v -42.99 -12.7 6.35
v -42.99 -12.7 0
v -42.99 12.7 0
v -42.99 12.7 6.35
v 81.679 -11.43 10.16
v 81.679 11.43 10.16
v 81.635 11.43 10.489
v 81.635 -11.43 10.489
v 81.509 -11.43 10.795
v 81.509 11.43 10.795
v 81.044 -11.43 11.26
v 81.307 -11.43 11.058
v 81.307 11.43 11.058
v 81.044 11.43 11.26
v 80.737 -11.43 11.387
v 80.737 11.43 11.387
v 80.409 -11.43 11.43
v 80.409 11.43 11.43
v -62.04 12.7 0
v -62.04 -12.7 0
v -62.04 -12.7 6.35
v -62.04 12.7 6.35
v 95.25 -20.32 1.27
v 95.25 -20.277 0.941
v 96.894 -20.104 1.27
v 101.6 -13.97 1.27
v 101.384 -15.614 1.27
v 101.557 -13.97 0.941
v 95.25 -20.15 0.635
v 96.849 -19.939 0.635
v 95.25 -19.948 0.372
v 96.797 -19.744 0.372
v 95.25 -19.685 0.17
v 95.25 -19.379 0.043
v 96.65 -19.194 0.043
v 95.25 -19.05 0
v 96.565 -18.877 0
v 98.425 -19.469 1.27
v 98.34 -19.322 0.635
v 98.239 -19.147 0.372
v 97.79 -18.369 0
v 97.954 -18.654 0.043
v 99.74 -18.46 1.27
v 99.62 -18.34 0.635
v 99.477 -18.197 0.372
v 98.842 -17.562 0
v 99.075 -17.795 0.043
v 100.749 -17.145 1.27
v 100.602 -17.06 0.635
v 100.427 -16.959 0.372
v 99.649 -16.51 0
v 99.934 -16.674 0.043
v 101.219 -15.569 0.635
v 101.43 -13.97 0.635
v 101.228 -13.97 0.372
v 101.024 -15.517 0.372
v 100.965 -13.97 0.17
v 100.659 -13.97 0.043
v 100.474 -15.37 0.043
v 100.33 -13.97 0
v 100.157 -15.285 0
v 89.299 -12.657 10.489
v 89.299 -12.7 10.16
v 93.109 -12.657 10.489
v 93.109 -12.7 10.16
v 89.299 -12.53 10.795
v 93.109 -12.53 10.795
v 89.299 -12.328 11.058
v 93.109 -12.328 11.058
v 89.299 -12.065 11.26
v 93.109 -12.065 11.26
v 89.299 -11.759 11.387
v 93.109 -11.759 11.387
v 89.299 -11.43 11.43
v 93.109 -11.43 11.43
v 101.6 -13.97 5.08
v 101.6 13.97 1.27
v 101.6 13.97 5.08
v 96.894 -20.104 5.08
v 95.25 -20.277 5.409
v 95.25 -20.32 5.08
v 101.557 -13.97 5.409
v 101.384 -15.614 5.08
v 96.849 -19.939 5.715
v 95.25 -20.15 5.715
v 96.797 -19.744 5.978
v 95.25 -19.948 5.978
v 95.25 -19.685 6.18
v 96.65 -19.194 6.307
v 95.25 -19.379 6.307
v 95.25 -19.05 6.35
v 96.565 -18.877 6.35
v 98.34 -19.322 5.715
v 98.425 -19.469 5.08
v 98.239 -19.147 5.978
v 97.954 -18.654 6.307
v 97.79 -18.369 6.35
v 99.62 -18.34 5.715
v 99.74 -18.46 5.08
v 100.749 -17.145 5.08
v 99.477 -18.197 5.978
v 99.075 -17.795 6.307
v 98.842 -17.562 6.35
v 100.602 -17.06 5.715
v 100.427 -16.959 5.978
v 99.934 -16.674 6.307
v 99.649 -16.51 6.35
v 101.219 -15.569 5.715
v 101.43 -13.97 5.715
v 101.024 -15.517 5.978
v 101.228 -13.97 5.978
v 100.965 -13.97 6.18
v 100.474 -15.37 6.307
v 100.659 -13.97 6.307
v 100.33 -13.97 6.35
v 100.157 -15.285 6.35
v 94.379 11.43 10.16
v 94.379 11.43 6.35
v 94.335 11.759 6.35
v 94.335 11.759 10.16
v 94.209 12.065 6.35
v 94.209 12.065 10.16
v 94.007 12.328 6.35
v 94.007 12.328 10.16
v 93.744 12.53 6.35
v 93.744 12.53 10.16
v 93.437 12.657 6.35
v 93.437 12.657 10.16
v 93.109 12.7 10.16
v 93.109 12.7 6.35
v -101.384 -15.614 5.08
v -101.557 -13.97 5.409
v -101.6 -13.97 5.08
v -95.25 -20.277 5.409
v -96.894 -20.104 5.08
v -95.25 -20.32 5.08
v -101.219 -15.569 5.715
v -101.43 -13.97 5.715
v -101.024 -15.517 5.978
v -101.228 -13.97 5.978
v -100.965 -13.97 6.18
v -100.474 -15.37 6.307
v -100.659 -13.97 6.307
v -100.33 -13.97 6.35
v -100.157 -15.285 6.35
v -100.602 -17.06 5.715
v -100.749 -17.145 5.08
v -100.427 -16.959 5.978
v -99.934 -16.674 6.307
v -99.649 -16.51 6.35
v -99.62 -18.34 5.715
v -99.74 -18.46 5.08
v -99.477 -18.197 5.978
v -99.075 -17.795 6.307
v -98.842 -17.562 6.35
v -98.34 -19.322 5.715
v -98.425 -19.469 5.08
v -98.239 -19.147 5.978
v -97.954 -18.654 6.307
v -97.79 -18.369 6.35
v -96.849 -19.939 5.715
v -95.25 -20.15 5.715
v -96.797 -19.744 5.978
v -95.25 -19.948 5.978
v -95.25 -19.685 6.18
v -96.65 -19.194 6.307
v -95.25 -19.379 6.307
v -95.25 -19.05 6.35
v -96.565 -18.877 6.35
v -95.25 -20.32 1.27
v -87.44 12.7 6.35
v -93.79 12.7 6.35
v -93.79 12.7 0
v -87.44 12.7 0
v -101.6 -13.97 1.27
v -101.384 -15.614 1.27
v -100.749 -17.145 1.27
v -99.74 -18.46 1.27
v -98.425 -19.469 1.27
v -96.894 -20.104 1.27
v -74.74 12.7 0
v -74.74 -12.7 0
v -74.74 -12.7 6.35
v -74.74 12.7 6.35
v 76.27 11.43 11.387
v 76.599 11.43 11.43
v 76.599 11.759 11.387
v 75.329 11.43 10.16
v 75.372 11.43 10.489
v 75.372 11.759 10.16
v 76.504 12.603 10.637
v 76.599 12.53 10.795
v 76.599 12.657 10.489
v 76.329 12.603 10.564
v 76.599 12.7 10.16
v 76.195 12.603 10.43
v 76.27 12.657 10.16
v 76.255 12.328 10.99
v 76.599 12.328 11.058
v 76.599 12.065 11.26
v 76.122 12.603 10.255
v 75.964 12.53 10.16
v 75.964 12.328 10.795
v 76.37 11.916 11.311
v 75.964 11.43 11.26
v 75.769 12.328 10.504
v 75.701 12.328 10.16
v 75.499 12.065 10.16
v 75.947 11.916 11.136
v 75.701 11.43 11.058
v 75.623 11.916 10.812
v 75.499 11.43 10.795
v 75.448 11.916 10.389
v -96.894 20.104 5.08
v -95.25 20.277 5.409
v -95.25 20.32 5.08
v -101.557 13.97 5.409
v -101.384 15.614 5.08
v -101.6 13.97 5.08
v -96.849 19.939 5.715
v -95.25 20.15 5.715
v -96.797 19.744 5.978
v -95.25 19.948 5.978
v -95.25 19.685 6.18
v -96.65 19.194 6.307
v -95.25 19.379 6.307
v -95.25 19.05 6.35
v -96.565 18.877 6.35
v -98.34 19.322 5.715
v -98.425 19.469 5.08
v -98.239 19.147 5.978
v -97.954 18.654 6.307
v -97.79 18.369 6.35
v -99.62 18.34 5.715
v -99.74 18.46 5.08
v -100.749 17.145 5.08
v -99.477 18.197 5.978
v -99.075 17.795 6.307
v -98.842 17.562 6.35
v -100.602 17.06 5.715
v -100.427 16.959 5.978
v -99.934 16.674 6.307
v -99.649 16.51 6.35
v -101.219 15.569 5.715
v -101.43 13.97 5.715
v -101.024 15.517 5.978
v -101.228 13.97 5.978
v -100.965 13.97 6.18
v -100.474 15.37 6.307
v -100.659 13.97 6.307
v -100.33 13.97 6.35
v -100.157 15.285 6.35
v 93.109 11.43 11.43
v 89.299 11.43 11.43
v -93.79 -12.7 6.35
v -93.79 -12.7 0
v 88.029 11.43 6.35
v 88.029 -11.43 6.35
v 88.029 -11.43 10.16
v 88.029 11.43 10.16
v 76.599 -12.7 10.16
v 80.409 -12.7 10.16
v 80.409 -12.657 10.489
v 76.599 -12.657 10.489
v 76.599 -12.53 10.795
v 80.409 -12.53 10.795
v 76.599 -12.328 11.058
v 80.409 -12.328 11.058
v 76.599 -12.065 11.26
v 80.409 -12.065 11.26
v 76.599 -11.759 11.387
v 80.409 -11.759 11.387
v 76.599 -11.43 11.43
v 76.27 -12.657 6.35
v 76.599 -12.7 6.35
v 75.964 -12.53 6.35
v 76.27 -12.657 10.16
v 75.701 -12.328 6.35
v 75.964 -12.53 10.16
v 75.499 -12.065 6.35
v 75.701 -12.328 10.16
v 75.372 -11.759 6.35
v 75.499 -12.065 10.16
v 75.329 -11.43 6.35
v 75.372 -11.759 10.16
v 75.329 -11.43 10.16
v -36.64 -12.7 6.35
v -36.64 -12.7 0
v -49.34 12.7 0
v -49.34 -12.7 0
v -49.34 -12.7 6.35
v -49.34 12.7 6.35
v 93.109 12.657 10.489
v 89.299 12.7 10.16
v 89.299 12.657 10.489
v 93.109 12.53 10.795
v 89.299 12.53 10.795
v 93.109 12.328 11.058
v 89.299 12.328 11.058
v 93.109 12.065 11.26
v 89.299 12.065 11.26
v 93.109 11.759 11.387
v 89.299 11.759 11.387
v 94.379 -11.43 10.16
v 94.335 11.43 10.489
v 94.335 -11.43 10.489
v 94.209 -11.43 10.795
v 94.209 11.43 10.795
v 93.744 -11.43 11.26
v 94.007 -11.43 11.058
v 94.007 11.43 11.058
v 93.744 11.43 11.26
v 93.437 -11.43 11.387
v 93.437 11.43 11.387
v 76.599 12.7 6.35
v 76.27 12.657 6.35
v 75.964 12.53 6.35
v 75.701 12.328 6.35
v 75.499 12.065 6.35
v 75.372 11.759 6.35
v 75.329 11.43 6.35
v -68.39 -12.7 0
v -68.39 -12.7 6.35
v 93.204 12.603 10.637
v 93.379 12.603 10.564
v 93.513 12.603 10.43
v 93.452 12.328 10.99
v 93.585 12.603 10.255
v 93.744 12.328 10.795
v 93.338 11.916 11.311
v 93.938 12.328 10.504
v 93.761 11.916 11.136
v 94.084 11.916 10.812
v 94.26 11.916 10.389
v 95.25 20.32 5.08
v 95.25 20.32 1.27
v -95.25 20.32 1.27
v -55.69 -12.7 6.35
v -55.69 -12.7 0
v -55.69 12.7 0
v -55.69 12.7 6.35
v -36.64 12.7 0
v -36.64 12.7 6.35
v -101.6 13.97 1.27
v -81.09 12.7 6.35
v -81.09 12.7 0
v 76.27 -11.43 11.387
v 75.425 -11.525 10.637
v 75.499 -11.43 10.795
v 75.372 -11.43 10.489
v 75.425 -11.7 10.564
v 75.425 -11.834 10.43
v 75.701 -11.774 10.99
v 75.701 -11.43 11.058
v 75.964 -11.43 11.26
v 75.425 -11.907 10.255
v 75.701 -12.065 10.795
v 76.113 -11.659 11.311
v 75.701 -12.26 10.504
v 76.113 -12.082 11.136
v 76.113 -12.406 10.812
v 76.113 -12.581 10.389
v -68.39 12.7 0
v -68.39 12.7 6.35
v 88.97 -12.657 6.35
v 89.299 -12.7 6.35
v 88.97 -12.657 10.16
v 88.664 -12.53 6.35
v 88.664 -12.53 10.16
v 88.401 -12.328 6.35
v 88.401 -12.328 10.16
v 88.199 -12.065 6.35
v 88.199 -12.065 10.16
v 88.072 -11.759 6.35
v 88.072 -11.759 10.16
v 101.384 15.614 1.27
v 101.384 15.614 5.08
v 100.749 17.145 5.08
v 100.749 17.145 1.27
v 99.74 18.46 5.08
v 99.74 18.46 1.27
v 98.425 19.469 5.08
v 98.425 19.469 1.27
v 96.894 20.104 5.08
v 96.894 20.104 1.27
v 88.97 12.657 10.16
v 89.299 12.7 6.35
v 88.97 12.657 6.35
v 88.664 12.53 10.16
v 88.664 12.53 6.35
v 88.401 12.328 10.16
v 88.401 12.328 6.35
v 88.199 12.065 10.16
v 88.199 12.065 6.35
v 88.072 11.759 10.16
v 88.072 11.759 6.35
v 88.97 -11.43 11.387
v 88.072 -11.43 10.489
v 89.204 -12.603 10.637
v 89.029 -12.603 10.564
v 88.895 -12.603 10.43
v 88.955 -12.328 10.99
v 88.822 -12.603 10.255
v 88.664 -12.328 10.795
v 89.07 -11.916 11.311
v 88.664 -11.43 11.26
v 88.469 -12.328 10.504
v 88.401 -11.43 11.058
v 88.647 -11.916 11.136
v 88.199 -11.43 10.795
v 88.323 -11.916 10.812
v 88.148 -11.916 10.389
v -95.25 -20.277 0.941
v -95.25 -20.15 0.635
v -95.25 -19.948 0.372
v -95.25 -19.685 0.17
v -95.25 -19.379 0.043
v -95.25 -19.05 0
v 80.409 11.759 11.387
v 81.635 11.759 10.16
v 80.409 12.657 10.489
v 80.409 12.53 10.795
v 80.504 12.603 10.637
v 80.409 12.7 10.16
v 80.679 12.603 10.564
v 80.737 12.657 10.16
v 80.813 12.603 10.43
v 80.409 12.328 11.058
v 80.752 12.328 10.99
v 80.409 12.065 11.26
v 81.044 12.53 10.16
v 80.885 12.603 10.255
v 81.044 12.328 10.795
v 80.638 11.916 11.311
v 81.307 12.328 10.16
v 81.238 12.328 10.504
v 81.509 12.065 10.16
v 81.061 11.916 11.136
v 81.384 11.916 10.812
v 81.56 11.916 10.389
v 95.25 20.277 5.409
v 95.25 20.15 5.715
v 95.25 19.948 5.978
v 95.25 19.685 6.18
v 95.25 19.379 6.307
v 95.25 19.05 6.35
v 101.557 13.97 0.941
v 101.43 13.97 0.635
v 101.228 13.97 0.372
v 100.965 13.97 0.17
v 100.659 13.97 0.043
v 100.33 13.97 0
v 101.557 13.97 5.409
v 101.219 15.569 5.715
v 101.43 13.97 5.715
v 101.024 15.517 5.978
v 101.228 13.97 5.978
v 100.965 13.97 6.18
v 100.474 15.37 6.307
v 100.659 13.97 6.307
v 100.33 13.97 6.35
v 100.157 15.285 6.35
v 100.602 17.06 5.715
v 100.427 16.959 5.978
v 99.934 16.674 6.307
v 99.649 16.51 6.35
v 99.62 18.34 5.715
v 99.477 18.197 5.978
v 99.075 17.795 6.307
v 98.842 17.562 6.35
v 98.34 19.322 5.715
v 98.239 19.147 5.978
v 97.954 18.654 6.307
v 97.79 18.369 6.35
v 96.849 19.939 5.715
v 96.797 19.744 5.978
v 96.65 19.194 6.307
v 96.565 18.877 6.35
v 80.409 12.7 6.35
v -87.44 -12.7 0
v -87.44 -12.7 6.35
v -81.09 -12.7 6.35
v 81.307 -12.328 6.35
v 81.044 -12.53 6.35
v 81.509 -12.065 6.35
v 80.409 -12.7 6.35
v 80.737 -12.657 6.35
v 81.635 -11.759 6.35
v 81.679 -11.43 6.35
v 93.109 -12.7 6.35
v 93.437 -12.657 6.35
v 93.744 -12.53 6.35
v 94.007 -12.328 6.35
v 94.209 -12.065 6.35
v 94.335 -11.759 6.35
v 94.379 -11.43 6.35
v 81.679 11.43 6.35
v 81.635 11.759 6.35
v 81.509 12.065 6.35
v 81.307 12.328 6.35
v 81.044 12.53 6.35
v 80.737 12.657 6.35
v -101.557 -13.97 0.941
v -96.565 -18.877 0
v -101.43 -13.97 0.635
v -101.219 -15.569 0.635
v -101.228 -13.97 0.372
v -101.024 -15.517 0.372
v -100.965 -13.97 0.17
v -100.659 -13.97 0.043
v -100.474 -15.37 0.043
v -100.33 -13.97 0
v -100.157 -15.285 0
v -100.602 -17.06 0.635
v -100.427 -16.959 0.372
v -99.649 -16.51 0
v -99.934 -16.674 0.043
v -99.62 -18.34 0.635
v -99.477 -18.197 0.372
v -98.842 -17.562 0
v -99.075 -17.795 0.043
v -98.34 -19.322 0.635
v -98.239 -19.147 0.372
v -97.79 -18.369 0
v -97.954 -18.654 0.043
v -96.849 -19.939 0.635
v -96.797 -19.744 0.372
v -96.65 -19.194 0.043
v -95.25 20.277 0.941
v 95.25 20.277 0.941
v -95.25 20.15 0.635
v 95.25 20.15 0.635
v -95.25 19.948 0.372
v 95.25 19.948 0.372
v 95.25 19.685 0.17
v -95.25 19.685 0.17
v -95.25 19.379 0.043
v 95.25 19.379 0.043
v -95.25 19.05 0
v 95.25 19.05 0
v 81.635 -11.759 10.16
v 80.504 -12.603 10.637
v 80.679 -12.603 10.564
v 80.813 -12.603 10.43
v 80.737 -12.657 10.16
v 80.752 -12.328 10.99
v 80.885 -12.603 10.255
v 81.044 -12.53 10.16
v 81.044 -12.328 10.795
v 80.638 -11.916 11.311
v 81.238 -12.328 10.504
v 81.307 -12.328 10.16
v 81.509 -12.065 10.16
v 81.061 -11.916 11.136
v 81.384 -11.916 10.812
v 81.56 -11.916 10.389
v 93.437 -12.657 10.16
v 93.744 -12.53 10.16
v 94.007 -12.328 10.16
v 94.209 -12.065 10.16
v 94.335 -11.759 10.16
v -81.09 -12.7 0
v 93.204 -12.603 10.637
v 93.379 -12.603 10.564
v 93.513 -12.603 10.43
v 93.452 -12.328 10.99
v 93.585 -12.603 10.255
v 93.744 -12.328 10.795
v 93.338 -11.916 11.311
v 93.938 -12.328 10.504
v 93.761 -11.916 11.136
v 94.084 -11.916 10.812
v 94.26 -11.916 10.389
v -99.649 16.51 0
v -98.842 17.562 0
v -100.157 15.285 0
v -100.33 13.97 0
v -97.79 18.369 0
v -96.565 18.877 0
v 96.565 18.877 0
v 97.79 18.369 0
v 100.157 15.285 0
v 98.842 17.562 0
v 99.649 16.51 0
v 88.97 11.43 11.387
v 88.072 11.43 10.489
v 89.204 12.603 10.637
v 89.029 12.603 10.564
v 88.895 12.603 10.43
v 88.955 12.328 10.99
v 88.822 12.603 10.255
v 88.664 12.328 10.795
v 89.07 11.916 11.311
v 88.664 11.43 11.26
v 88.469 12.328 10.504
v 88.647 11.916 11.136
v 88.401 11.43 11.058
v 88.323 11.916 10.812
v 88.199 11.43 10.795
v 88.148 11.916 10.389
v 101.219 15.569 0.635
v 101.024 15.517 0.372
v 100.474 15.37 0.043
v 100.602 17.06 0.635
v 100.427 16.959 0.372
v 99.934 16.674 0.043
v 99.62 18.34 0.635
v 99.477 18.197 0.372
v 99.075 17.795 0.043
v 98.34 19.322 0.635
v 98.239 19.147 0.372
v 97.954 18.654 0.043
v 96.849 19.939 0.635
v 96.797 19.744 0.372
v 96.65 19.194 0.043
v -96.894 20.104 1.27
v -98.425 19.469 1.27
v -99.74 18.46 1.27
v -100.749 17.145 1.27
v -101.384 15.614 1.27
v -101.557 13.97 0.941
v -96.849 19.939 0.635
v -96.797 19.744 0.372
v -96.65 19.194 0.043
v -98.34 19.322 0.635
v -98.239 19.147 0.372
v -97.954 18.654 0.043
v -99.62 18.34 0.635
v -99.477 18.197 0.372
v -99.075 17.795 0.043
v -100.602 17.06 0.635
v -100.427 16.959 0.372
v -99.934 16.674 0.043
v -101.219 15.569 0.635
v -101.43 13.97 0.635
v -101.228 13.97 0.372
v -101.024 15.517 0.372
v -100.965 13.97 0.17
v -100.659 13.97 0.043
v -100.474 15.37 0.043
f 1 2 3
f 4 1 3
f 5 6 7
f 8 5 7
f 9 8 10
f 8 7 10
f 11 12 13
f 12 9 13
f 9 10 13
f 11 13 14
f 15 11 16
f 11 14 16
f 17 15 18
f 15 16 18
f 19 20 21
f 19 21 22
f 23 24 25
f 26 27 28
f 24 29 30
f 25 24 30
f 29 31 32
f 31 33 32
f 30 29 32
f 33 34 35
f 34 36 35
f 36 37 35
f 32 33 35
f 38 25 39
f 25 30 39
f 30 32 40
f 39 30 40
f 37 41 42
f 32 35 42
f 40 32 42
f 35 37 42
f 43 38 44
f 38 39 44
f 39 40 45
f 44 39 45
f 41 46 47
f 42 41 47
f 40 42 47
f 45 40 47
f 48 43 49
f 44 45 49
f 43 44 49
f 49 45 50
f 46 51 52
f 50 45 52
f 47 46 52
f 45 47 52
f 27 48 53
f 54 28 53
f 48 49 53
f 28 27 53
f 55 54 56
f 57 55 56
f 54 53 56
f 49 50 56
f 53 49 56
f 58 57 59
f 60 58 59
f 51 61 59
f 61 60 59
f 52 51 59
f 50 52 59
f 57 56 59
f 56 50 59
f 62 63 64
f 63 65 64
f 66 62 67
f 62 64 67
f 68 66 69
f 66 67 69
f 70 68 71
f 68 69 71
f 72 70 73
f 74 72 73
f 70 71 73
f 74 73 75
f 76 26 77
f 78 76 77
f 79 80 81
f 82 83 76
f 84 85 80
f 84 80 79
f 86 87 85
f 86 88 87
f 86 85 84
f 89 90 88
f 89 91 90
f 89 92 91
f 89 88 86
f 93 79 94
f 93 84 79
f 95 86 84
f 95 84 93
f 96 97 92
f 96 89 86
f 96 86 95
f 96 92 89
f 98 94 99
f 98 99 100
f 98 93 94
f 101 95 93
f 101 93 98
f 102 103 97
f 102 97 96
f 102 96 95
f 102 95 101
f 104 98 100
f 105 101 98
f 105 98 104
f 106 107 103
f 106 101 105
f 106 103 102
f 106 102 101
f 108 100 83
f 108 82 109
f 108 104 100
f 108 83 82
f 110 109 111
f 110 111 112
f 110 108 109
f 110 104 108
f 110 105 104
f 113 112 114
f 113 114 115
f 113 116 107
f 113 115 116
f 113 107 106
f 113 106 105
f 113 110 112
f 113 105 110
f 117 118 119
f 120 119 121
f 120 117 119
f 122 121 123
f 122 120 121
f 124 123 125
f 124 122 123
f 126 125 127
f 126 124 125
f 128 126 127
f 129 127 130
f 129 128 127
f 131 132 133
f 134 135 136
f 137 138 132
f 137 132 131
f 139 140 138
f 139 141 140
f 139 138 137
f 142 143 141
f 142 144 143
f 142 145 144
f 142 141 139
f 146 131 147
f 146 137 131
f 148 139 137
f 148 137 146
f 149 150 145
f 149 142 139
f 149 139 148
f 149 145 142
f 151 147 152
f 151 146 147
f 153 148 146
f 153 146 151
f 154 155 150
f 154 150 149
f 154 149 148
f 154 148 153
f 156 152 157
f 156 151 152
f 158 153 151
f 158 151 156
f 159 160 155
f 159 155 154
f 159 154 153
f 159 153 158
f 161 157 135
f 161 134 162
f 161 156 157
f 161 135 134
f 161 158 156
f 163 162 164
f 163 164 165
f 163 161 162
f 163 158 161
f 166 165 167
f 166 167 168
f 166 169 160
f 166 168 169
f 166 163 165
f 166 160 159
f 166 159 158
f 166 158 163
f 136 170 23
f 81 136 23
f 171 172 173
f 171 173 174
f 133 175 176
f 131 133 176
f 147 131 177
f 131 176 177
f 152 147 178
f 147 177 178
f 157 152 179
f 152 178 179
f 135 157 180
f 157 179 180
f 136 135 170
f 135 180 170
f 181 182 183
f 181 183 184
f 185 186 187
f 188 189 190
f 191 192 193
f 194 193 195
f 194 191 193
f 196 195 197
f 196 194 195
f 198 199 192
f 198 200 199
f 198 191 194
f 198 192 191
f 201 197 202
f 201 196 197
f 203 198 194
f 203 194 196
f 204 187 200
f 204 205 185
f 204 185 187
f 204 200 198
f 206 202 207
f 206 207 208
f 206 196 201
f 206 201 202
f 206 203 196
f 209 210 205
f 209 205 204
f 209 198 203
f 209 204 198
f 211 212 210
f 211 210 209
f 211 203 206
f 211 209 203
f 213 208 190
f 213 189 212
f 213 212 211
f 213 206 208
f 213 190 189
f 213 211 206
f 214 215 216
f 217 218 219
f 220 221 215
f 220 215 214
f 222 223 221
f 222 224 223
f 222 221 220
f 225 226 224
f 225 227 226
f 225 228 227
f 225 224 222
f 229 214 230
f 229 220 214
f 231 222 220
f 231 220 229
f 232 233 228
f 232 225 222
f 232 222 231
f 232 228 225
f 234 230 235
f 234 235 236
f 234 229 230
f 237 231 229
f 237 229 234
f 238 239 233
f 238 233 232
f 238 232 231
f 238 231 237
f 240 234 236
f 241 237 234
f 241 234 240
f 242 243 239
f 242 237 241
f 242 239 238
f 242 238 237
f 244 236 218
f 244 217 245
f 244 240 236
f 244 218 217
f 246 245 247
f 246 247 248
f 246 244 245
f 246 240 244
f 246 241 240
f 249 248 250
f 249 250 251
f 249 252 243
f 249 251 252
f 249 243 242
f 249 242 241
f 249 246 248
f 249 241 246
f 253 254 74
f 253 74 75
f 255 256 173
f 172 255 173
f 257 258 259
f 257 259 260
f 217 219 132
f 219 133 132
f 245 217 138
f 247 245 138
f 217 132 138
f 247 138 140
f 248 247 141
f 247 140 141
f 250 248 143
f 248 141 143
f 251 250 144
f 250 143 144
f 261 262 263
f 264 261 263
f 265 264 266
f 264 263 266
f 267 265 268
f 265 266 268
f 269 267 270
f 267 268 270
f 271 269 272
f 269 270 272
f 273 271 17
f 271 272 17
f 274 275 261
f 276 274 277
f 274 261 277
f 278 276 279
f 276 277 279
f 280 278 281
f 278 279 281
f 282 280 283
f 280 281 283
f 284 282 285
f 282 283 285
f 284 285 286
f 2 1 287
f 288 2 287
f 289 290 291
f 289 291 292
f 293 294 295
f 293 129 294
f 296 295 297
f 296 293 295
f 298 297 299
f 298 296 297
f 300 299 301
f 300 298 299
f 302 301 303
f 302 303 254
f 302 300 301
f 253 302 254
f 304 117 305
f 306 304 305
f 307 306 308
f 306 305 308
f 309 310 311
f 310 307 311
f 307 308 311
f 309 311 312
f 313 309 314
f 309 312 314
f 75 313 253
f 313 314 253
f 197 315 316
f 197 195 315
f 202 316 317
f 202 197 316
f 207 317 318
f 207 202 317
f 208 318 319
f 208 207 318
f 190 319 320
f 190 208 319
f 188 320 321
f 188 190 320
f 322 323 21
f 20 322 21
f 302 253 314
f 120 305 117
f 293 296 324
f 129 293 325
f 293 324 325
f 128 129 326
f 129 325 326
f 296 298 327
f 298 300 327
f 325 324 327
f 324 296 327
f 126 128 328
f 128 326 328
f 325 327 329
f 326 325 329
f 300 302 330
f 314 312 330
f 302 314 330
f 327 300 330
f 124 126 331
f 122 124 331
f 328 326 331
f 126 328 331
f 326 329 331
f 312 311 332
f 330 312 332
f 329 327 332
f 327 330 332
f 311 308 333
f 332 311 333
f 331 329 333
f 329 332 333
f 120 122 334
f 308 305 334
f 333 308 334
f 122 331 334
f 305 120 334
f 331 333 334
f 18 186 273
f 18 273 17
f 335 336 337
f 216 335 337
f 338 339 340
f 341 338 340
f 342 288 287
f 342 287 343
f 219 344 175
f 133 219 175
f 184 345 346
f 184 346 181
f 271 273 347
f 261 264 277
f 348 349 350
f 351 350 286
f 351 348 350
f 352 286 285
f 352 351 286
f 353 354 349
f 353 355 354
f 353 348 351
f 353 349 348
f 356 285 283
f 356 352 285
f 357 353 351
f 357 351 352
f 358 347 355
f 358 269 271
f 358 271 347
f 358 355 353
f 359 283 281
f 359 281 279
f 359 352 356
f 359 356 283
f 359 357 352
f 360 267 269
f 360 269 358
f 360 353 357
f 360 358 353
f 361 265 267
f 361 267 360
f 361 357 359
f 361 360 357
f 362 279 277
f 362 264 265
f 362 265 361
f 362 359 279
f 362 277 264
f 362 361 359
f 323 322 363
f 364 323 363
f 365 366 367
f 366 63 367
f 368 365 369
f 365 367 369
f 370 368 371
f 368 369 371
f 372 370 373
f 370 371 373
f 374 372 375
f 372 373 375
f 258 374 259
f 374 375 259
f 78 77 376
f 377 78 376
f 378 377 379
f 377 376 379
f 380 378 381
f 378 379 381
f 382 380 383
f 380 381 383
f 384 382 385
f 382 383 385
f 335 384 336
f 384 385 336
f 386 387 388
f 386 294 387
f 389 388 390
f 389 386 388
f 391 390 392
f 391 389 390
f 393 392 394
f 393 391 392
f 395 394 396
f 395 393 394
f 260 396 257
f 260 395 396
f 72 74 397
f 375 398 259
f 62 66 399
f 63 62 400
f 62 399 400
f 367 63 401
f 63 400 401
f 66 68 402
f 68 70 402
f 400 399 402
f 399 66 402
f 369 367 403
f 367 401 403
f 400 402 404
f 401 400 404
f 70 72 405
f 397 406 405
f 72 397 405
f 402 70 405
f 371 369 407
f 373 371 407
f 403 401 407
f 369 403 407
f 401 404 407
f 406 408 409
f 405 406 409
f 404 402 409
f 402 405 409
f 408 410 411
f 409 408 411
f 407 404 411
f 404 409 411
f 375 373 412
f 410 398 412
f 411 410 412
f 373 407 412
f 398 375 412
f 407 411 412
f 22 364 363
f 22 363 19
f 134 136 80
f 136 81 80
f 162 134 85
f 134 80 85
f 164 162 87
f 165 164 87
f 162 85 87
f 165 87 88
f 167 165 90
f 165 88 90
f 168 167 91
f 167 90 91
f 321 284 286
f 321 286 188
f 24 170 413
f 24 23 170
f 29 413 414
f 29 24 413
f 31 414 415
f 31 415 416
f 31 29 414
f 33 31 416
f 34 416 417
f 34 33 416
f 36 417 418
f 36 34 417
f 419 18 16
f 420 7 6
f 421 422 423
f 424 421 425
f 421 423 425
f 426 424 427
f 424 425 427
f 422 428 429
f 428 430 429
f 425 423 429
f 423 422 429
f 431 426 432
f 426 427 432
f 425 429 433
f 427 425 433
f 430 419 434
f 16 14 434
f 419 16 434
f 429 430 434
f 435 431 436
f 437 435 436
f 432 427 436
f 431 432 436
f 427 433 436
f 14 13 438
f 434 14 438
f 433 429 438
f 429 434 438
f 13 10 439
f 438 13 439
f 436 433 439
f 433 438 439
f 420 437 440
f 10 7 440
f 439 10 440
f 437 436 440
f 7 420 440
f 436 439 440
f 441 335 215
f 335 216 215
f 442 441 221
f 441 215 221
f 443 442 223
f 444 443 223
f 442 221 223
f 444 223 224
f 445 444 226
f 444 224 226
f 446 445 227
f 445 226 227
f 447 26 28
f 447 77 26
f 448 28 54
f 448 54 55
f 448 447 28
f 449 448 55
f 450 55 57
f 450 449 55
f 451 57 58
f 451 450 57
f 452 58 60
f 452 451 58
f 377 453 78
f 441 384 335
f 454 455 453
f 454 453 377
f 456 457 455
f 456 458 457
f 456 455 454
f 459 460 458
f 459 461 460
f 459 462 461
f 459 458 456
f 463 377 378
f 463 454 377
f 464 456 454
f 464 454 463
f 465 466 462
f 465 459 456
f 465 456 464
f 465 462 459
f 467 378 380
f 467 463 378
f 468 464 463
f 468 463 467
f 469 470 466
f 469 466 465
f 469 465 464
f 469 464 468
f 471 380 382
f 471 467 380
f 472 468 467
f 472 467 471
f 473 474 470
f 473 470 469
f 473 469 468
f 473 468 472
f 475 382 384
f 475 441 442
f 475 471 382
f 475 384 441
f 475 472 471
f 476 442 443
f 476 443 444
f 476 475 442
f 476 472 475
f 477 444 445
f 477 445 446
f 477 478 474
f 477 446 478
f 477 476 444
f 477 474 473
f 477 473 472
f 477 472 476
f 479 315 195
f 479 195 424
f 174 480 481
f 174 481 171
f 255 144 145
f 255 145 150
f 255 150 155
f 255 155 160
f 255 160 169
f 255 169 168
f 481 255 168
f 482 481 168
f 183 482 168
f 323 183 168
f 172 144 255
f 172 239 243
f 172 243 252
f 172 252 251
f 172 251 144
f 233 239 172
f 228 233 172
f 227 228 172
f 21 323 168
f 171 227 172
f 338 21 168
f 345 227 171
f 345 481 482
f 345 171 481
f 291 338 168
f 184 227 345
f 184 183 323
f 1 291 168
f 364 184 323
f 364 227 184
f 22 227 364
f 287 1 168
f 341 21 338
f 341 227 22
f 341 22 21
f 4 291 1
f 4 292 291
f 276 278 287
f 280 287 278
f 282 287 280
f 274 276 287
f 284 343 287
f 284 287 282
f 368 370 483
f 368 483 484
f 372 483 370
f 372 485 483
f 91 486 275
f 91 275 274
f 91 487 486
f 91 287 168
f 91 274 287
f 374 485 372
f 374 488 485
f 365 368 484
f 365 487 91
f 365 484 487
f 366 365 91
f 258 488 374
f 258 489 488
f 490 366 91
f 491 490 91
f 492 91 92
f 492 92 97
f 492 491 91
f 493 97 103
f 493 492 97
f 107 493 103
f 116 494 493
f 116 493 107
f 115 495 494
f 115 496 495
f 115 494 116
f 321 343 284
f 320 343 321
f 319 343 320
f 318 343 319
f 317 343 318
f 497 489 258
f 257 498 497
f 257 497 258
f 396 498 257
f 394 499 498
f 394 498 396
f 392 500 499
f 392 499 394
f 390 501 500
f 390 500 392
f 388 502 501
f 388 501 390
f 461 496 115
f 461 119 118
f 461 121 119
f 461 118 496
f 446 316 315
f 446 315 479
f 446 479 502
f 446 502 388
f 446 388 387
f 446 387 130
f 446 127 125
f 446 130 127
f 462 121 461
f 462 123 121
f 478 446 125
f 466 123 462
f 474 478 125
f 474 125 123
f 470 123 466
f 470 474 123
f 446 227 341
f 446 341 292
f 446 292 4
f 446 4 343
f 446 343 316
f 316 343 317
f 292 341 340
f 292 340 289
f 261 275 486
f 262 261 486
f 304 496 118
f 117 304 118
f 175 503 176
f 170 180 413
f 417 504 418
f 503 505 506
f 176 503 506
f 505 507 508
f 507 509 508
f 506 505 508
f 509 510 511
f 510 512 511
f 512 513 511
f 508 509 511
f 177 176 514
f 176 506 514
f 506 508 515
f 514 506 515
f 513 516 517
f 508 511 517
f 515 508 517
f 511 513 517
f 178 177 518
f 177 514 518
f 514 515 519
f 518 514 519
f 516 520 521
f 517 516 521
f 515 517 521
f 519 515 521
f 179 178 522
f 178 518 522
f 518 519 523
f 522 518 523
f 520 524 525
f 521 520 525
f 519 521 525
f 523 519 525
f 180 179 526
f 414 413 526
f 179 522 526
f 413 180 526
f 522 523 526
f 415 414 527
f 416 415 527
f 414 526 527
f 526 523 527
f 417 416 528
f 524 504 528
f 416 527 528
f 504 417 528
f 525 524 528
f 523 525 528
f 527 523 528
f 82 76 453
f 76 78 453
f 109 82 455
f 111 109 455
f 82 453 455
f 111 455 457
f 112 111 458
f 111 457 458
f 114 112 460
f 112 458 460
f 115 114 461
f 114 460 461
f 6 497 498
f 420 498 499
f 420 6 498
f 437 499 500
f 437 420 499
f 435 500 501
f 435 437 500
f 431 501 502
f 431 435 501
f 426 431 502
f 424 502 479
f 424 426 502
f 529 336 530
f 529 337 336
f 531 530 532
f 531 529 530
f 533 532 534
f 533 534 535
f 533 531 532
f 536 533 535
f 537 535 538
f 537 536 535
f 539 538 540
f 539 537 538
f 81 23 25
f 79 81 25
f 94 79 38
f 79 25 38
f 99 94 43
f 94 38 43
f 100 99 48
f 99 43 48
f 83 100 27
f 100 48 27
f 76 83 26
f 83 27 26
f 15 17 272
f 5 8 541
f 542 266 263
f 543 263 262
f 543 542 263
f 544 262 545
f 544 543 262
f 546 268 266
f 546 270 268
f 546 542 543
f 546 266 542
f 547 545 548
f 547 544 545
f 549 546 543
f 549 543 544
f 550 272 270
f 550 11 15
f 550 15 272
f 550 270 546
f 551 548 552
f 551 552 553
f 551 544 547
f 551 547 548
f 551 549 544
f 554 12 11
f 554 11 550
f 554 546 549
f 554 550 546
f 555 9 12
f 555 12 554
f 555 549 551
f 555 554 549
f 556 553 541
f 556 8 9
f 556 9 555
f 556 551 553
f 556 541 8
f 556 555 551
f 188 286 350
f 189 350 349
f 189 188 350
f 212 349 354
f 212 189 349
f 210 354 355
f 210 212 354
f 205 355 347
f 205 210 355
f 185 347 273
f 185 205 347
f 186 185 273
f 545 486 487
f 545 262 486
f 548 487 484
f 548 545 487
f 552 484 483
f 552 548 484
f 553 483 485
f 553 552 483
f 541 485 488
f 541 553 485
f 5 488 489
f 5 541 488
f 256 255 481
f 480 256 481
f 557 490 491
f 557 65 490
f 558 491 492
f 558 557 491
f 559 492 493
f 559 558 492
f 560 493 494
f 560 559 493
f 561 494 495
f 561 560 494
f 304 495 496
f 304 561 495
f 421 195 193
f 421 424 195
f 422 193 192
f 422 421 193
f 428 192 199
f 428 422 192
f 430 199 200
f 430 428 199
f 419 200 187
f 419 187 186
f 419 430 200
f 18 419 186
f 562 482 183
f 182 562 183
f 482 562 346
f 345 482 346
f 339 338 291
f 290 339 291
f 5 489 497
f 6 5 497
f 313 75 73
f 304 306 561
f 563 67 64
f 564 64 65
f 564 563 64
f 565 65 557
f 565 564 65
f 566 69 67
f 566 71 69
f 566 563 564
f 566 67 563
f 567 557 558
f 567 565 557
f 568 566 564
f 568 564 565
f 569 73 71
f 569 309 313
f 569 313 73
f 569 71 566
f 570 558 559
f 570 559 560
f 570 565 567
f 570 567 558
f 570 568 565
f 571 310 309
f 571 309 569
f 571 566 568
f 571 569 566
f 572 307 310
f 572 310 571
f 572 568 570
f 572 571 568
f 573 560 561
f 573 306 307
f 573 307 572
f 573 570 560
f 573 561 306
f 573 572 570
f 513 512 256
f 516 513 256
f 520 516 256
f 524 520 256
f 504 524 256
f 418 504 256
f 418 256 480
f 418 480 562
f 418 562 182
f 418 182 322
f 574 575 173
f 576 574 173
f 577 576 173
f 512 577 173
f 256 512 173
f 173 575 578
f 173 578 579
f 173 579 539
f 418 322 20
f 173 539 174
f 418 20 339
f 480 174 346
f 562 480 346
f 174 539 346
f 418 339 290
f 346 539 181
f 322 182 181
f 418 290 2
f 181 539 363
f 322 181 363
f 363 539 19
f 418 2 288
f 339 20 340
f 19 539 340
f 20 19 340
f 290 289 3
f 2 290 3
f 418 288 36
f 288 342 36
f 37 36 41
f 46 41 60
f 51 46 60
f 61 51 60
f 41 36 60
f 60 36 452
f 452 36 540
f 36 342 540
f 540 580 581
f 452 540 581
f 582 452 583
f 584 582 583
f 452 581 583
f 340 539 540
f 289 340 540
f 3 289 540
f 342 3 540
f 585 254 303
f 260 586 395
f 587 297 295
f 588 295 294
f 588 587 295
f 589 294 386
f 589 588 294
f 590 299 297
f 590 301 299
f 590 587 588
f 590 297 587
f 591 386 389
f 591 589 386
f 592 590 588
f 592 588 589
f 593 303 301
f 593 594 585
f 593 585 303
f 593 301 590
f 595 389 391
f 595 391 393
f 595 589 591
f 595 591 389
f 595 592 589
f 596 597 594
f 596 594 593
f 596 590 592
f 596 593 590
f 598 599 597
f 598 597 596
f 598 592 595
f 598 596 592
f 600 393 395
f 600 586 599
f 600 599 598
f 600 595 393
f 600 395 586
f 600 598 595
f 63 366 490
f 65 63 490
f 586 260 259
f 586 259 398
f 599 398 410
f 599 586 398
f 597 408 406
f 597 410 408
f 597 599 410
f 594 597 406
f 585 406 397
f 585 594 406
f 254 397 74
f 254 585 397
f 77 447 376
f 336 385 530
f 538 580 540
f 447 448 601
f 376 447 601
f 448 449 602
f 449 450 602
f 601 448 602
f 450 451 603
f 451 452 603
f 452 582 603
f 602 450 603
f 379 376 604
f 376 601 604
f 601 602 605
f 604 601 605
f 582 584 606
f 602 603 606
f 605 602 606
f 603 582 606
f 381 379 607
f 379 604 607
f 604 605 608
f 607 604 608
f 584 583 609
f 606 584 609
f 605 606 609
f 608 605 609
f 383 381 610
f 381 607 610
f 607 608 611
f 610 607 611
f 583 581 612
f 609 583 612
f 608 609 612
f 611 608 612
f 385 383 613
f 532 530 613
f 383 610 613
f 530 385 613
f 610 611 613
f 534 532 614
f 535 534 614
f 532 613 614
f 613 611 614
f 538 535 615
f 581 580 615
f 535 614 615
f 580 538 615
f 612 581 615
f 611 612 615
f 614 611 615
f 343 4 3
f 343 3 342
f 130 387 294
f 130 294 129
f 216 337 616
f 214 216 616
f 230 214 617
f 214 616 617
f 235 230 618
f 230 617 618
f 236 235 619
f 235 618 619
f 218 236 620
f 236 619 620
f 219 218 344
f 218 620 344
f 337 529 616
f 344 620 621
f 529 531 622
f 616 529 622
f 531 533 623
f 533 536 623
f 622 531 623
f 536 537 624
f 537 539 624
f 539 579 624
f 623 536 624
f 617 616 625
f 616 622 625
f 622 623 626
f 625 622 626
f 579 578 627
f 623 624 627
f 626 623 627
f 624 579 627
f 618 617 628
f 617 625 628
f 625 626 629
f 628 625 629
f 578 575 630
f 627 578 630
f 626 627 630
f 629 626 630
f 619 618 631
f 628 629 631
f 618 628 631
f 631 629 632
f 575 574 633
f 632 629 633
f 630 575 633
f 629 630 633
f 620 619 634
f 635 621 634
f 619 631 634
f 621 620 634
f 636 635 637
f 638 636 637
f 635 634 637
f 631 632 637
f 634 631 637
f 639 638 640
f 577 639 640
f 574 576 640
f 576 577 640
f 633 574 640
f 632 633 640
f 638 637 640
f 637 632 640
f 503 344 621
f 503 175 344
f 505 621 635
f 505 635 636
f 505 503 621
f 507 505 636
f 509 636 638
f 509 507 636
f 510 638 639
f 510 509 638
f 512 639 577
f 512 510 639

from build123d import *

# Parameters (mm, degrees)
F0_W     = 6.35
F0_H     = 25.4
F0_R     = 17.5576306553
F1_DEPTH = 6.35
F2_R     = 1.27
F3_W     = 6.35
F3_H     = 25.4
F4_DEPTH = 5.08
F5_R     = 1.27


# Not quite as in the source:
# - a feature names something its author has since deleted; it is built from what else it names


with BuildPart() as f1:
    # F0 (on Top) → F1 (new body)
    with BuildSketch(Plane.XY):
        with BuildLine():
            ThreePointArc((101.6, 13.97), (99.7401280605, 18.4601280605), (95.25, 20.32))
            Line((95.25, 20.32), (-95.25, 20.32))
            ThreePointArc((-95.25, 20.32), (-99.7401280605, 18.4601280605), (-101.6, 13.97))
            Line((-101.6, 13.97), (-101.6, -13.97))
            ThreePointArc((-101.6, -13.97), (-99.7401280605, -18.4601280605), (-95.25, -20.32))
            Line((-95.25, -20.32), (95.25, -20.32))
            ThreePointArc((95.25, -20.32), (99.7401280605, -18.4601280605), (101.6, -13.97))
            Line((101.6, -13.97), (101.6, 13.97))
        make_face()
        with Locations((-90.6151607633, 0)):
            Rectangle(F0_W, F0_H, mode=Mode.SUBTRACT)
        with Locations((-77.9151607633, 0)):
            Rectangle(F0_W, F0_H, mode=Mode.SUBTRACT)
        with Locations((-65.2151607633, 0)):
            Rectangle(F0_W, F0_H, mode=Mode.SUBTRACT)
        with Locations((-52.5151607633, 0)):
            Rectangle(F0_W, F0_H, mode=Mode.SUBTRACT)
        with Locations((-39.8151607633, 0)):
            Rectangle(F0_W, F0_H, mode=Mode.SUBTRACT)
        with Locations((4.1378471069, 0)):
            Circle(F0_R, mode=Mode.SUBTRACT)
        with Locations((4.1378471069, 0)):
            Circle(F0_R)
    extrude(amount=F1_DEPTH)

    # F2
    f2_edges = [f1.edges().sort_by_distance(p)[0] for p in [
        (0, -20.32, 0),
        (0, -20.32, 6.35),
    ]]
    fillet(f2_edges, radius=F2_R)

    # F3 (on face) → F4 (join)
    with BuildSketch(Plane.XY.offset(6.35)):
        with Locations((78.503764081, 0)):
            Rectangle(F3_W, F3_H)
        with Locations((91.203764081, 0)):
            Rectangle(F3_W, F3_H)
    extrude(amount=F4_DEPTH)

    # F5
    f5_edges = [f1.edges().sort_by_distance(p)[0] for p in [
        (81.678764, 0, 11.43),
        (78.503764, -12.7, 11.43),
        (75.328764, 0, 11.43),
        (78.503764, 12.7, 11.43),
        (88.028764, 0, 11.43),
        (94.378764, 0, 11.43),
        (91.203764, -12.7, 11.43),
        (91.203764, 12.7, 11.43),
        (94.378764, -12.7, 8.89),
        (88.028764, -12.7, 8.89),
        (81.678764, -12.7, 8.89),
        (75.328764, -12.7, 8.89),
        (81.678764, 12.7, 8.89),
        (94.378764, 12.7, 8.89),
        (88.028764, 12.7, 8.89),
        (75.328764, 12.7, 8.89),
    ]]
    fillet(f5_edges, radius=F5_R)


solid = f1.part
